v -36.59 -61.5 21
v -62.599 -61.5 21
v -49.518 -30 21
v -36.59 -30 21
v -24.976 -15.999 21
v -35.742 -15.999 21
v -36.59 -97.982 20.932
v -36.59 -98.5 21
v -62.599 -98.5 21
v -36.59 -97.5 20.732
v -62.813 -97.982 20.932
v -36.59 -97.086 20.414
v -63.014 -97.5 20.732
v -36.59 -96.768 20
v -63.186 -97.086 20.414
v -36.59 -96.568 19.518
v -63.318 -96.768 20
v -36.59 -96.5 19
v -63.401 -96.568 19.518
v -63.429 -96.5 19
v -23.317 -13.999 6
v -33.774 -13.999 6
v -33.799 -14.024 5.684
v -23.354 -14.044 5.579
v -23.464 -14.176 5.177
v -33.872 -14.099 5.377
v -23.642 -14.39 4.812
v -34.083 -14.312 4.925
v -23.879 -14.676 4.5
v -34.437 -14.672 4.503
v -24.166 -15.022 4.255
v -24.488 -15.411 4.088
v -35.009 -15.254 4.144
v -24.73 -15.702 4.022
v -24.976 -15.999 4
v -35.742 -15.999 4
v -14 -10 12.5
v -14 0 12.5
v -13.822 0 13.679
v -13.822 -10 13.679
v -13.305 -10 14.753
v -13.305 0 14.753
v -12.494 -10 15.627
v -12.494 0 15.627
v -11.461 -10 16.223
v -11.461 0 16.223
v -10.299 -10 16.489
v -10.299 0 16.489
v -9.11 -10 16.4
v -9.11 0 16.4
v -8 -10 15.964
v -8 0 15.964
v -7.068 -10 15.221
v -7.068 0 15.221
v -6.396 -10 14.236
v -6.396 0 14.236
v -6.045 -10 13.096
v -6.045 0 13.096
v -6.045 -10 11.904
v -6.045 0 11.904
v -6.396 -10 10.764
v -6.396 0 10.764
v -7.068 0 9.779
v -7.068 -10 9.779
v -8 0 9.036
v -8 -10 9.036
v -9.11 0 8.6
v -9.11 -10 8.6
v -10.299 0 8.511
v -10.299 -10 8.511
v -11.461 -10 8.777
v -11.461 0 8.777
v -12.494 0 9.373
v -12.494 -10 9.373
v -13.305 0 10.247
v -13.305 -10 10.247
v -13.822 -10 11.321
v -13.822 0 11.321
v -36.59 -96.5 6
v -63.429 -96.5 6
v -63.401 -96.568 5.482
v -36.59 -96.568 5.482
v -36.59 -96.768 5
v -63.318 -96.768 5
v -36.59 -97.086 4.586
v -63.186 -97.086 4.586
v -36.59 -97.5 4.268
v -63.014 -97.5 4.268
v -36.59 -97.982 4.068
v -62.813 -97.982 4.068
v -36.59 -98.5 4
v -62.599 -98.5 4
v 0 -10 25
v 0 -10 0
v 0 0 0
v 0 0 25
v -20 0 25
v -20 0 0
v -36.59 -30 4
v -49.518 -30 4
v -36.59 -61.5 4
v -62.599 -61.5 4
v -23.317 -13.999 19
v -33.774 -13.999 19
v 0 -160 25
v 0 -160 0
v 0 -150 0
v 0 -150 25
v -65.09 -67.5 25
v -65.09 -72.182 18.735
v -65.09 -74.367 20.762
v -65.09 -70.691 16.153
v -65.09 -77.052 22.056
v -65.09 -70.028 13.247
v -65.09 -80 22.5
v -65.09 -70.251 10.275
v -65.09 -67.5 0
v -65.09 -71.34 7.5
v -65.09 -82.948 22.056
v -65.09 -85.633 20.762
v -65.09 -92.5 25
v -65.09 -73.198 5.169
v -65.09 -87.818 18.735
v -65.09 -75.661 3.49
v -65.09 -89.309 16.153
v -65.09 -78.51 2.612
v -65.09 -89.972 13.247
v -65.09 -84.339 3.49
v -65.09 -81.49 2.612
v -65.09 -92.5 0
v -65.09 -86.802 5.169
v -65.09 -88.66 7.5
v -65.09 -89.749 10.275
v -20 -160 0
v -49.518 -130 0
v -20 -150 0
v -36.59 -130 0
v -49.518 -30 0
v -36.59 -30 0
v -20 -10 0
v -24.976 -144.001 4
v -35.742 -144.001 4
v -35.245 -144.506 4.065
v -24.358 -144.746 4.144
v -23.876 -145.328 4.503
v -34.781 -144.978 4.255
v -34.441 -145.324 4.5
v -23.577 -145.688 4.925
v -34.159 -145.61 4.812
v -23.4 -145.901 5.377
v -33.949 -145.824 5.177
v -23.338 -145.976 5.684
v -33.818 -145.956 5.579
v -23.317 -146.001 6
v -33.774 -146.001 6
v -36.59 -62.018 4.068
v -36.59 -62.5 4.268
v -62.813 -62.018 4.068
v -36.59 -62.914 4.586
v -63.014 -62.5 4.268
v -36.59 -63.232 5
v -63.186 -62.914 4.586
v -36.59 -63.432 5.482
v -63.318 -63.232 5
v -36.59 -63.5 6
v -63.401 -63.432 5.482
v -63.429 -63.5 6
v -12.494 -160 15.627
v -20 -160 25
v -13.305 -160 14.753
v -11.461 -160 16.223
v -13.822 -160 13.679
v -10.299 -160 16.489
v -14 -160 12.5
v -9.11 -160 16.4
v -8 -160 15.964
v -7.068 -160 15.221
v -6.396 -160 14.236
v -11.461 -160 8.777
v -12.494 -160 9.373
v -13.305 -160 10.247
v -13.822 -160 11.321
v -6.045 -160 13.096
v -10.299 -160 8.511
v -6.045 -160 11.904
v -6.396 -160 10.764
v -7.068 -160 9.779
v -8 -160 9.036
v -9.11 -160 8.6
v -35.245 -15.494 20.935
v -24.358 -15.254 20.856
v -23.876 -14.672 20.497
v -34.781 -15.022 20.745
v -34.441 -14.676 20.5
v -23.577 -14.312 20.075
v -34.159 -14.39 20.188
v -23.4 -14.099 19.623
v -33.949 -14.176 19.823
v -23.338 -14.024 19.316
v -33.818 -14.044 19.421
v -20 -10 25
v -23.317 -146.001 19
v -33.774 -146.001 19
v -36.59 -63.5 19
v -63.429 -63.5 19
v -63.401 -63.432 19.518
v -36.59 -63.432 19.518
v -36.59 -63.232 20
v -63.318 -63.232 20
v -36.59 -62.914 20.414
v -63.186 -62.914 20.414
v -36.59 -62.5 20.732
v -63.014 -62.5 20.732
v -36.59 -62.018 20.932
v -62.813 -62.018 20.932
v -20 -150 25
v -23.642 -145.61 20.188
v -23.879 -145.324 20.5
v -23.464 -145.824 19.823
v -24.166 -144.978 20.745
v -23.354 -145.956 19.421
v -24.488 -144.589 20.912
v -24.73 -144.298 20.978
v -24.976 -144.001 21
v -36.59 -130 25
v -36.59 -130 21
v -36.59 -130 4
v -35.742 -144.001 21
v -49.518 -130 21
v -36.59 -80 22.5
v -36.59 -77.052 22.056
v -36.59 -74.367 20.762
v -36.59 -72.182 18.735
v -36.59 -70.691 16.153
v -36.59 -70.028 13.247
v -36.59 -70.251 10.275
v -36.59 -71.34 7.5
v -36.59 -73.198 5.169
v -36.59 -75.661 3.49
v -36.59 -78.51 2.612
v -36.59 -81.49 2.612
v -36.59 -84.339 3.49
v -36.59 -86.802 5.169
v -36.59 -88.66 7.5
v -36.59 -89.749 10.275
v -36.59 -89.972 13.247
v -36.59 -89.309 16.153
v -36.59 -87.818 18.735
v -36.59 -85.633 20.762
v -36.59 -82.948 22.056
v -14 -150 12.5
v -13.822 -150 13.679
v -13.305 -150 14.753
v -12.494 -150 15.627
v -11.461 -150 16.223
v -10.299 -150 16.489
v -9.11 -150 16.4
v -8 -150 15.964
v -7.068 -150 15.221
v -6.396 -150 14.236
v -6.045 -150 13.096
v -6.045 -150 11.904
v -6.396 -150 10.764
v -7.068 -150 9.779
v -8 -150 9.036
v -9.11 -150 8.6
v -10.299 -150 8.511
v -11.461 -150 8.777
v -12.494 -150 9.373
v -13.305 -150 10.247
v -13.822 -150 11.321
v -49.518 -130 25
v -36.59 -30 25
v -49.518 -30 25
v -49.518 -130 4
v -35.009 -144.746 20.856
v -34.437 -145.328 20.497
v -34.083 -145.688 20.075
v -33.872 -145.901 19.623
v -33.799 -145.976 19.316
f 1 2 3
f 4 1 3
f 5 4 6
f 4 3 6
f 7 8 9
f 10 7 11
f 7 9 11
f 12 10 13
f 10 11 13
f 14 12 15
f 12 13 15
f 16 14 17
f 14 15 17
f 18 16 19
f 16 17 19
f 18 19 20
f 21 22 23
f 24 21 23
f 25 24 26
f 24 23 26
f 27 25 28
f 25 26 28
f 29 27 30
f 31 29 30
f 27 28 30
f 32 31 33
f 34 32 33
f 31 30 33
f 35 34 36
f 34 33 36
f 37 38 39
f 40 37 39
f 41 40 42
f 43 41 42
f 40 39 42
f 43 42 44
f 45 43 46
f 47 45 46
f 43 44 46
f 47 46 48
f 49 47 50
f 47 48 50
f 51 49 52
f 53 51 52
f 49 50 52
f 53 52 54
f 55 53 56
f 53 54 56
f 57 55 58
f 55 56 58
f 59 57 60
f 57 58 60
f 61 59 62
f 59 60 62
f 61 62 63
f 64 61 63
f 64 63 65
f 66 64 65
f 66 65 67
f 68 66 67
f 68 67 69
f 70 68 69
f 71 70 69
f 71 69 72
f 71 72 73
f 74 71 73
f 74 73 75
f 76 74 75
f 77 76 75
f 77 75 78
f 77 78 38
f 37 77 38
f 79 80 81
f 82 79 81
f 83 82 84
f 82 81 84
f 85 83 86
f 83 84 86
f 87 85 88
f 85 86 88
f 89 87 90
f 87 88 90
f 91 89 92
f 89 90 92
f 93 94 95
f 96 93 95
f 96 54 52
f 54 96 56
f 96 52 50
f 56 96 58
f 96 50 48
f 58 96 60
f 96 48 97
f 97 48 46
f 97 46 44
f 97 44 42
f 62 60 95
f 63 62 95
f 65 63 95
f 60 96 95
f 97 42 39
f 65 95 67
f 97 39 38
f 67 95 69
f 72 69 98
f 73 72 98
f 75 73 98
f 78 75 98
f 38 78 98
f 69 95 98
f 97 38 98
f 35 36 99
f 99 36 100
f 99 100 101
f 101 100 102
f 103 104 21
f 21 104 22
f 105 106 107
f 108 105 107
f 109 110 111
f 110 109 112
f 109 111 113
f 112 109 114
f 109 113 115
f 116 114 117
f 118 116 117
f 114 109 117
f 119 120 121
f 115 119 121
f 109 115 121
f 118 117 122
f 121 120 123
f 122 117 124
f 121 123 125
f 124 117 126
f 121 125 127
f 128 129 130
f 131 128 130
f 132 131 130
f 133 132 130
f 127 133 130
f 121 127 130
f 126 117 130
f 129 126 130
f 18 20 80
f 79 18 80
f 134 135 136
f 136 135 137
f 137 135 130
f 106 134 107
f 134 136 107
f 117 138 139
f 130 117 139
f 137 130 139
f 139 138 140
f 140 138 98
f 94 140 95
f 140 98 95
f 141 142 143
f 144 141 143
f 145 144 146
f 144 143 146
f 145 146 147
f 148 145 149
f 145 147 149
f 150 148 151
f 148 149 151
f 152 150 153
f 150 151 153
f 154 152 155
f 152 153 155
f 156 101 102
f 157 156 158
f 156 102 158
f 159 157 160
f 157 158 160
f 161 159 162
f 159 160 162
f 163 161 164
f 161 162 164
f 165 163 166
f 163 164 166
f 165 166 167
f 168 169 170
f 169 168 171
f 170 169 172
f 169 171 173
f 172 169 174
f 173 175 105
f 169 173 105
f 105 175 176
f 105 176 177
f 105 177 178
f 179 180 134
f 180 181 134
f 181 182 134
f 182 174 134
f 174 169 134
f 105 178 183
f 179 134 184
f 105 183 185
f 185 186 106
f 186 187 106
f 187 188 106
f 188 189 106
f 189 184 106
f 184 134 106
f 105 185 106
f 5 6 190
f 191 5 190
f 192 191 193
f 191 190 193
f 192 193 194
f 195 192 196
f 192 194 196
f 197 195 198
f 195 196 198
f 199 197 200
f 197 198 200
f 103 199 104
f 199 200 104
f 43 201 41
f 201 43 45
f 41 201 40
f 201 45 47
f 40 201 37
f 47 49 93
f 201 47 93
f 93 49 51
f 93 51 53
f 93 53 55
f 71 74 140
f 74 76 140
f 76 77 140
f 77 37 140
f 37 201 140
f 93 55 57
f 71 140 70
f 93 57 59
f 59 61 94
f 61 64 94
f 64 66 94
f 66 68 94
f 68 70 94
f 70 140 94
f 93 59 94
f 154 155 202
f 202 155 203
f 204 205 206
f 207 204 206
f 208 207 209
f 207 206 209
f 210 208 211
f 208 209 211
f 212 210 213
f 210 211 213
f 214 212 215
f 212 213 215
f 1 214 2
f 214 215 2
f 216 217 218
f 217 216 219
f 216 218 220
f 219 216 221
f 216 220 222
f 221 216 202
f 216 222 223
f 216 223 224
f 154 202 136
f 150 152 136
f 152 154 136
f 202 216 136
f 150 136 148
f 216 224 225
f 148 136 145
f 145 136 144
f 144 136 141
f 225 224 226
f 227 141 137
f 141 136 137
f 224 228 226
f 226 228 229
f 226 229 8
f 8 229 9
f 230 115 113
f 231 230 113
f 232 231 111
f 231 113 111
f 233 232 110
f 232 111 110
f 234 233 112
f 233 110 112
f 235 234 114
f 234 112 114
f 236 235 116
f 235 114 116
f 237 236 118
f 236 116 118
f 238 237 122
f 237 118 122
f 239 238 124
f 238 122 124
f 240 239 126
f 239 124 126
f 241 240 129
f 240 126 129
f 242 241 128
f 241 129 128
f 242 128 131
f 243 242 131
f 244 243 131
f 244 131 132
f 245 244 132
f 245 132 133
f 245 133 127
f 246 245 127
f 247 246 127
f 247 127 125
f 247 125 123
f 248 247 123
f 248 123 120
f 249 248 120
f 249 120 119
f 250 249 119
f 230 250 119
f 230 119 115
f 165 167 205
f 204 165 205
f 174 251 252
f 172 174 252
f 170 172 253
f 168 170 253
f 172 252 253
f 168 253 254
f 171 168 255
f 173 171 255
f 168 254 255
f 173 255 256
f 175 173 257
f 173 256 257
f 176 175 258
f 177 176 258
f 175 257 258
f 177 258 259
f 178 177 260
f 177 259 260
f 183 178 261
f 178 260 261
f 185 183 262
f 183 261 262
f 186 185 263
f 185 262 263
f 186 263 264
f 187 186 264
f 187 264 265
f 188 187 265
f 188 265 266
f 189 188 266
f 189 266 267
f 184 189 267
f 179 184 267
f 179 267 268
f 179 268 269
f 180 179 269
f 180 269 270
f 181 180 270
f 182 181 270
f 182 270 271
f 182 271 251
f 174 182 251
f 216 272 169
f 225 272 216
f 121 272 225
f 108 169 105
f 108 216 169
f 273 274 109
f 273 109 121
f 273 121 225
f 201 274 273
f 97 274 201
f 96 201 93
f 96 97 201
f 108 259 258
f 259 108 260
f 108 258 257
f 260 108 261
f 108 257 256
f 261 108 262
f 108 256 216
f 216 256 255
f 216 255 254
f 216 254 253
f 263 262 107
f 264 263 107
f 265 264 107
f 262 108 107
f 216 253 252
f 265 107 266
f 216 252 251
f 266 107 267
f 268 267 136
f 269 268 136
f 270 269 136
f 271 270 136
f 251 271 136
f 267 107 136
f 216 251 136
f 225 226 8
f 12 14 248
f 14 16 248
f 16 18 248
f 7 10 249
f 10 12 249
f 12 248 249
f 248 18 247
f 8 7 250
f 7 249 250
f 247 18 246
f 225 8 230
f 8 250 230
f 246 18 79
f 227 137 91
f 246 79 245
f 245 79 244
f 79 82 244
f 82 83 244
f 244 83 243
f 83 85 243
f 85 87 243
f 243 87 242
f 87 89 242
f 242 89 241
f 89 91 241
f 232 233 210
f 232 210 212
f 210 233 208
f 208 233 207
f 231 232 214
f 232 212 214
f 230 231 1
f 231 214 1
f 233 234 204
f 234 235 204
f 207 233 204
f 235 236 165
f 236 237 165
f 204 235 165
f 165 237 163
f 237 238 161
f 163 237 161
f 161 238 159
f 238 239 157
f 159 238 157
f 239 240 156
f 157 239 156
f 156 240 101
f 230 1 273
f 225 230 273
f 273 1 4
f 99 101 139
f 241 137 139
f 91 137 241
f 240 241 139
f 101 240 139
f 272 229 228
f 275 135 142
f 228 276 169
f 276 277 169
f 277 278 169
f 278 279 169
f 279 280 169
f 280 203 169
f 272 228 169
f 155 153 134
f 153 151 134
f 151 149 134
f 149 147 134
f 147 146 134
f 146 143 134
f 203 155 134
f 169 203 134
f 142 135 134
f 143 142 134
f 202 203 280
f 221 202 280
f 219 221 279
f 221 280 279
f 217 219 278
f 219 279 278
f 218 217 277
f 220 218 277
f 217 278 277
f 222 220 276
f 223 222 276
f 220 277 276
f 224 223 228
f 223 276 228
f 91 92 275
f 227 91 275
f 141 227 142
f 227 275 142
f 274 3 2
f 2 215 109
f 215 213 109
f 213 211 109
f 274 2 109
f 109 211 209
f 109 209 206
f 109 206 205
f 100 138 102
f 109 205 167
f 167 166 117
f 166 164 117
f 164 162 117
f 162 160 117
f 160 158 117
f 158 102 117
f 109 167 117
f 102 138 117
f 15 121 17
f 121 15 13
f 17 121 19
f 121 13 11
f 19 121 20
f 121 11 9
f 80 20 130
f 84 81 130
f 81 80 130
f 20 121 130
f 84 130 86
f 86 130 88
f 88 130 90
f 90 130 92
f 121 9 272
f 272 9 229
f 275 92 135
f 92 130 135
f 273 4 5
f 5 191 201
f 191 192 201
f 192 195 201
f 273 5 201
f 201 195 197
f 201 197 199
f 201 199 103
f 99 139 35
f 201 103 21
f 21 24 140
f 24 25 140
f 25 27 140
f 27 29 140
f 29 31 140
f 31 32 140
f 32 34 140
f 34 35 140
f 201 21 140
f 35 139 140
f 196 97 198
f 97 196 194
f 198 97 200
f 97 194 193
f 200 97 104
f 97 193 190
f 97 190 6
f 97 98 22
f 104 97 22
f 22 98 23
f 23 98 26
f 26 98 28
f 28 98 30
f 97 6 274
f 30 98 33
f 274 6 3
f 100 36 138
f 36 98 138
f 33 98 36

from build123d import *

# Parameters (mm, degrees)
BOSS_EXTRUDE1_DEPTH = 25
SKETCH3_R           = 10
CUT_EXTRUDE2_DEPTH  = 175.532828144
SKETCH4_R           = 4
CUT_EXTRUDE3_DEPTH  = 175.532828144


with BuildPart() as part:
    # Sketch1 → Boss-Extrude1 (new body)
    with BuildSketch(Plane.XY):
        Polygon((0, 0), (-20, 0), (-49.518324122, -30), (-65.09, -67.5), (-65.09, -92.5), (-49.518324122, -130), (-20, -160), (0, -160), (0, -150), (-20, -150), (-36.59, -130), (-36.59, -30), (-20, -10), (0, -10), align=None)
    extrude(amount=BOSS_EXTRUDE1_DEPTH)

    # Sketch3 → Cut-Extrude2 (cut, through all)
    with BuildSketch(Plane.ZY.offset(65.09)):
        with Locations((12.5, -80)):
            Circle(SKETCH3_R)
        with BuildLine():
            Line((6, -63.5), (19, -63.5))
            ThreePointArc((19, -63.5), (20.414213562, -62.914213562), (21, -61.5))
            Line((21, -61.5), (21, -15.999055713))
            ThreePointArc((21, -15.999055713), (20.414213562, -14.584842151), (19, -13.999055713))
            Line((19, -13.999055713), (6, -13.999055713))
            ThreePointArc((6, -13.999055713), (4.585786438, -14.584842151), (4, -15.999055713))
            Line((4, -15.999055713), (4, -61.5))
            ThreePointArc((4, -61.5), (4.585786438, -62.914213562), (6, -63.5))
        make_face()
        with BuildLine():
            Line((6, -146.000944287), (19, -146.000944287))
            ThreePointArc((19, -146.000944287), (20.414213562, -145.415157849), (21, -144.000944287))
            Line((21, -144.000944287), (21, -98.5))
            ThreePointArc((21, -98.5), (20.414213562, -97.085786438), (19, -96.5))
            Line((19, -96.5), (6, -96.5))
            ThreePointArc((6, -96.5), (4.585786438, -97.085786438), (4, -98.5))
            Line((4, -98.5), (4, -144.000944287))
            ThreePointArc((4, -144.000944287), (4.585786438, -145.415157849), (6, -146.000944287))
        make_face()
    extrude(amount=-CUT_EXTRUDE2_DEPTH, mode=Mode.SUBTRACT)

    # Sketch4 → Cut-Extrude3 (cut, through all)
    with BuildSketch(Plane(origin=(0, 0, 0), x_dir=(1, 0, 0), z_dir=(0, 1, 0))):
        with Locations(Location((-10, -12.5, 0), (0, 0, 180))):
            Circle(SKETCH4_R)
    extrude(amount=-CUT_EXTRUDE3_DEPTH, mode=Mode.SUBTRACT)


solid = part.part
